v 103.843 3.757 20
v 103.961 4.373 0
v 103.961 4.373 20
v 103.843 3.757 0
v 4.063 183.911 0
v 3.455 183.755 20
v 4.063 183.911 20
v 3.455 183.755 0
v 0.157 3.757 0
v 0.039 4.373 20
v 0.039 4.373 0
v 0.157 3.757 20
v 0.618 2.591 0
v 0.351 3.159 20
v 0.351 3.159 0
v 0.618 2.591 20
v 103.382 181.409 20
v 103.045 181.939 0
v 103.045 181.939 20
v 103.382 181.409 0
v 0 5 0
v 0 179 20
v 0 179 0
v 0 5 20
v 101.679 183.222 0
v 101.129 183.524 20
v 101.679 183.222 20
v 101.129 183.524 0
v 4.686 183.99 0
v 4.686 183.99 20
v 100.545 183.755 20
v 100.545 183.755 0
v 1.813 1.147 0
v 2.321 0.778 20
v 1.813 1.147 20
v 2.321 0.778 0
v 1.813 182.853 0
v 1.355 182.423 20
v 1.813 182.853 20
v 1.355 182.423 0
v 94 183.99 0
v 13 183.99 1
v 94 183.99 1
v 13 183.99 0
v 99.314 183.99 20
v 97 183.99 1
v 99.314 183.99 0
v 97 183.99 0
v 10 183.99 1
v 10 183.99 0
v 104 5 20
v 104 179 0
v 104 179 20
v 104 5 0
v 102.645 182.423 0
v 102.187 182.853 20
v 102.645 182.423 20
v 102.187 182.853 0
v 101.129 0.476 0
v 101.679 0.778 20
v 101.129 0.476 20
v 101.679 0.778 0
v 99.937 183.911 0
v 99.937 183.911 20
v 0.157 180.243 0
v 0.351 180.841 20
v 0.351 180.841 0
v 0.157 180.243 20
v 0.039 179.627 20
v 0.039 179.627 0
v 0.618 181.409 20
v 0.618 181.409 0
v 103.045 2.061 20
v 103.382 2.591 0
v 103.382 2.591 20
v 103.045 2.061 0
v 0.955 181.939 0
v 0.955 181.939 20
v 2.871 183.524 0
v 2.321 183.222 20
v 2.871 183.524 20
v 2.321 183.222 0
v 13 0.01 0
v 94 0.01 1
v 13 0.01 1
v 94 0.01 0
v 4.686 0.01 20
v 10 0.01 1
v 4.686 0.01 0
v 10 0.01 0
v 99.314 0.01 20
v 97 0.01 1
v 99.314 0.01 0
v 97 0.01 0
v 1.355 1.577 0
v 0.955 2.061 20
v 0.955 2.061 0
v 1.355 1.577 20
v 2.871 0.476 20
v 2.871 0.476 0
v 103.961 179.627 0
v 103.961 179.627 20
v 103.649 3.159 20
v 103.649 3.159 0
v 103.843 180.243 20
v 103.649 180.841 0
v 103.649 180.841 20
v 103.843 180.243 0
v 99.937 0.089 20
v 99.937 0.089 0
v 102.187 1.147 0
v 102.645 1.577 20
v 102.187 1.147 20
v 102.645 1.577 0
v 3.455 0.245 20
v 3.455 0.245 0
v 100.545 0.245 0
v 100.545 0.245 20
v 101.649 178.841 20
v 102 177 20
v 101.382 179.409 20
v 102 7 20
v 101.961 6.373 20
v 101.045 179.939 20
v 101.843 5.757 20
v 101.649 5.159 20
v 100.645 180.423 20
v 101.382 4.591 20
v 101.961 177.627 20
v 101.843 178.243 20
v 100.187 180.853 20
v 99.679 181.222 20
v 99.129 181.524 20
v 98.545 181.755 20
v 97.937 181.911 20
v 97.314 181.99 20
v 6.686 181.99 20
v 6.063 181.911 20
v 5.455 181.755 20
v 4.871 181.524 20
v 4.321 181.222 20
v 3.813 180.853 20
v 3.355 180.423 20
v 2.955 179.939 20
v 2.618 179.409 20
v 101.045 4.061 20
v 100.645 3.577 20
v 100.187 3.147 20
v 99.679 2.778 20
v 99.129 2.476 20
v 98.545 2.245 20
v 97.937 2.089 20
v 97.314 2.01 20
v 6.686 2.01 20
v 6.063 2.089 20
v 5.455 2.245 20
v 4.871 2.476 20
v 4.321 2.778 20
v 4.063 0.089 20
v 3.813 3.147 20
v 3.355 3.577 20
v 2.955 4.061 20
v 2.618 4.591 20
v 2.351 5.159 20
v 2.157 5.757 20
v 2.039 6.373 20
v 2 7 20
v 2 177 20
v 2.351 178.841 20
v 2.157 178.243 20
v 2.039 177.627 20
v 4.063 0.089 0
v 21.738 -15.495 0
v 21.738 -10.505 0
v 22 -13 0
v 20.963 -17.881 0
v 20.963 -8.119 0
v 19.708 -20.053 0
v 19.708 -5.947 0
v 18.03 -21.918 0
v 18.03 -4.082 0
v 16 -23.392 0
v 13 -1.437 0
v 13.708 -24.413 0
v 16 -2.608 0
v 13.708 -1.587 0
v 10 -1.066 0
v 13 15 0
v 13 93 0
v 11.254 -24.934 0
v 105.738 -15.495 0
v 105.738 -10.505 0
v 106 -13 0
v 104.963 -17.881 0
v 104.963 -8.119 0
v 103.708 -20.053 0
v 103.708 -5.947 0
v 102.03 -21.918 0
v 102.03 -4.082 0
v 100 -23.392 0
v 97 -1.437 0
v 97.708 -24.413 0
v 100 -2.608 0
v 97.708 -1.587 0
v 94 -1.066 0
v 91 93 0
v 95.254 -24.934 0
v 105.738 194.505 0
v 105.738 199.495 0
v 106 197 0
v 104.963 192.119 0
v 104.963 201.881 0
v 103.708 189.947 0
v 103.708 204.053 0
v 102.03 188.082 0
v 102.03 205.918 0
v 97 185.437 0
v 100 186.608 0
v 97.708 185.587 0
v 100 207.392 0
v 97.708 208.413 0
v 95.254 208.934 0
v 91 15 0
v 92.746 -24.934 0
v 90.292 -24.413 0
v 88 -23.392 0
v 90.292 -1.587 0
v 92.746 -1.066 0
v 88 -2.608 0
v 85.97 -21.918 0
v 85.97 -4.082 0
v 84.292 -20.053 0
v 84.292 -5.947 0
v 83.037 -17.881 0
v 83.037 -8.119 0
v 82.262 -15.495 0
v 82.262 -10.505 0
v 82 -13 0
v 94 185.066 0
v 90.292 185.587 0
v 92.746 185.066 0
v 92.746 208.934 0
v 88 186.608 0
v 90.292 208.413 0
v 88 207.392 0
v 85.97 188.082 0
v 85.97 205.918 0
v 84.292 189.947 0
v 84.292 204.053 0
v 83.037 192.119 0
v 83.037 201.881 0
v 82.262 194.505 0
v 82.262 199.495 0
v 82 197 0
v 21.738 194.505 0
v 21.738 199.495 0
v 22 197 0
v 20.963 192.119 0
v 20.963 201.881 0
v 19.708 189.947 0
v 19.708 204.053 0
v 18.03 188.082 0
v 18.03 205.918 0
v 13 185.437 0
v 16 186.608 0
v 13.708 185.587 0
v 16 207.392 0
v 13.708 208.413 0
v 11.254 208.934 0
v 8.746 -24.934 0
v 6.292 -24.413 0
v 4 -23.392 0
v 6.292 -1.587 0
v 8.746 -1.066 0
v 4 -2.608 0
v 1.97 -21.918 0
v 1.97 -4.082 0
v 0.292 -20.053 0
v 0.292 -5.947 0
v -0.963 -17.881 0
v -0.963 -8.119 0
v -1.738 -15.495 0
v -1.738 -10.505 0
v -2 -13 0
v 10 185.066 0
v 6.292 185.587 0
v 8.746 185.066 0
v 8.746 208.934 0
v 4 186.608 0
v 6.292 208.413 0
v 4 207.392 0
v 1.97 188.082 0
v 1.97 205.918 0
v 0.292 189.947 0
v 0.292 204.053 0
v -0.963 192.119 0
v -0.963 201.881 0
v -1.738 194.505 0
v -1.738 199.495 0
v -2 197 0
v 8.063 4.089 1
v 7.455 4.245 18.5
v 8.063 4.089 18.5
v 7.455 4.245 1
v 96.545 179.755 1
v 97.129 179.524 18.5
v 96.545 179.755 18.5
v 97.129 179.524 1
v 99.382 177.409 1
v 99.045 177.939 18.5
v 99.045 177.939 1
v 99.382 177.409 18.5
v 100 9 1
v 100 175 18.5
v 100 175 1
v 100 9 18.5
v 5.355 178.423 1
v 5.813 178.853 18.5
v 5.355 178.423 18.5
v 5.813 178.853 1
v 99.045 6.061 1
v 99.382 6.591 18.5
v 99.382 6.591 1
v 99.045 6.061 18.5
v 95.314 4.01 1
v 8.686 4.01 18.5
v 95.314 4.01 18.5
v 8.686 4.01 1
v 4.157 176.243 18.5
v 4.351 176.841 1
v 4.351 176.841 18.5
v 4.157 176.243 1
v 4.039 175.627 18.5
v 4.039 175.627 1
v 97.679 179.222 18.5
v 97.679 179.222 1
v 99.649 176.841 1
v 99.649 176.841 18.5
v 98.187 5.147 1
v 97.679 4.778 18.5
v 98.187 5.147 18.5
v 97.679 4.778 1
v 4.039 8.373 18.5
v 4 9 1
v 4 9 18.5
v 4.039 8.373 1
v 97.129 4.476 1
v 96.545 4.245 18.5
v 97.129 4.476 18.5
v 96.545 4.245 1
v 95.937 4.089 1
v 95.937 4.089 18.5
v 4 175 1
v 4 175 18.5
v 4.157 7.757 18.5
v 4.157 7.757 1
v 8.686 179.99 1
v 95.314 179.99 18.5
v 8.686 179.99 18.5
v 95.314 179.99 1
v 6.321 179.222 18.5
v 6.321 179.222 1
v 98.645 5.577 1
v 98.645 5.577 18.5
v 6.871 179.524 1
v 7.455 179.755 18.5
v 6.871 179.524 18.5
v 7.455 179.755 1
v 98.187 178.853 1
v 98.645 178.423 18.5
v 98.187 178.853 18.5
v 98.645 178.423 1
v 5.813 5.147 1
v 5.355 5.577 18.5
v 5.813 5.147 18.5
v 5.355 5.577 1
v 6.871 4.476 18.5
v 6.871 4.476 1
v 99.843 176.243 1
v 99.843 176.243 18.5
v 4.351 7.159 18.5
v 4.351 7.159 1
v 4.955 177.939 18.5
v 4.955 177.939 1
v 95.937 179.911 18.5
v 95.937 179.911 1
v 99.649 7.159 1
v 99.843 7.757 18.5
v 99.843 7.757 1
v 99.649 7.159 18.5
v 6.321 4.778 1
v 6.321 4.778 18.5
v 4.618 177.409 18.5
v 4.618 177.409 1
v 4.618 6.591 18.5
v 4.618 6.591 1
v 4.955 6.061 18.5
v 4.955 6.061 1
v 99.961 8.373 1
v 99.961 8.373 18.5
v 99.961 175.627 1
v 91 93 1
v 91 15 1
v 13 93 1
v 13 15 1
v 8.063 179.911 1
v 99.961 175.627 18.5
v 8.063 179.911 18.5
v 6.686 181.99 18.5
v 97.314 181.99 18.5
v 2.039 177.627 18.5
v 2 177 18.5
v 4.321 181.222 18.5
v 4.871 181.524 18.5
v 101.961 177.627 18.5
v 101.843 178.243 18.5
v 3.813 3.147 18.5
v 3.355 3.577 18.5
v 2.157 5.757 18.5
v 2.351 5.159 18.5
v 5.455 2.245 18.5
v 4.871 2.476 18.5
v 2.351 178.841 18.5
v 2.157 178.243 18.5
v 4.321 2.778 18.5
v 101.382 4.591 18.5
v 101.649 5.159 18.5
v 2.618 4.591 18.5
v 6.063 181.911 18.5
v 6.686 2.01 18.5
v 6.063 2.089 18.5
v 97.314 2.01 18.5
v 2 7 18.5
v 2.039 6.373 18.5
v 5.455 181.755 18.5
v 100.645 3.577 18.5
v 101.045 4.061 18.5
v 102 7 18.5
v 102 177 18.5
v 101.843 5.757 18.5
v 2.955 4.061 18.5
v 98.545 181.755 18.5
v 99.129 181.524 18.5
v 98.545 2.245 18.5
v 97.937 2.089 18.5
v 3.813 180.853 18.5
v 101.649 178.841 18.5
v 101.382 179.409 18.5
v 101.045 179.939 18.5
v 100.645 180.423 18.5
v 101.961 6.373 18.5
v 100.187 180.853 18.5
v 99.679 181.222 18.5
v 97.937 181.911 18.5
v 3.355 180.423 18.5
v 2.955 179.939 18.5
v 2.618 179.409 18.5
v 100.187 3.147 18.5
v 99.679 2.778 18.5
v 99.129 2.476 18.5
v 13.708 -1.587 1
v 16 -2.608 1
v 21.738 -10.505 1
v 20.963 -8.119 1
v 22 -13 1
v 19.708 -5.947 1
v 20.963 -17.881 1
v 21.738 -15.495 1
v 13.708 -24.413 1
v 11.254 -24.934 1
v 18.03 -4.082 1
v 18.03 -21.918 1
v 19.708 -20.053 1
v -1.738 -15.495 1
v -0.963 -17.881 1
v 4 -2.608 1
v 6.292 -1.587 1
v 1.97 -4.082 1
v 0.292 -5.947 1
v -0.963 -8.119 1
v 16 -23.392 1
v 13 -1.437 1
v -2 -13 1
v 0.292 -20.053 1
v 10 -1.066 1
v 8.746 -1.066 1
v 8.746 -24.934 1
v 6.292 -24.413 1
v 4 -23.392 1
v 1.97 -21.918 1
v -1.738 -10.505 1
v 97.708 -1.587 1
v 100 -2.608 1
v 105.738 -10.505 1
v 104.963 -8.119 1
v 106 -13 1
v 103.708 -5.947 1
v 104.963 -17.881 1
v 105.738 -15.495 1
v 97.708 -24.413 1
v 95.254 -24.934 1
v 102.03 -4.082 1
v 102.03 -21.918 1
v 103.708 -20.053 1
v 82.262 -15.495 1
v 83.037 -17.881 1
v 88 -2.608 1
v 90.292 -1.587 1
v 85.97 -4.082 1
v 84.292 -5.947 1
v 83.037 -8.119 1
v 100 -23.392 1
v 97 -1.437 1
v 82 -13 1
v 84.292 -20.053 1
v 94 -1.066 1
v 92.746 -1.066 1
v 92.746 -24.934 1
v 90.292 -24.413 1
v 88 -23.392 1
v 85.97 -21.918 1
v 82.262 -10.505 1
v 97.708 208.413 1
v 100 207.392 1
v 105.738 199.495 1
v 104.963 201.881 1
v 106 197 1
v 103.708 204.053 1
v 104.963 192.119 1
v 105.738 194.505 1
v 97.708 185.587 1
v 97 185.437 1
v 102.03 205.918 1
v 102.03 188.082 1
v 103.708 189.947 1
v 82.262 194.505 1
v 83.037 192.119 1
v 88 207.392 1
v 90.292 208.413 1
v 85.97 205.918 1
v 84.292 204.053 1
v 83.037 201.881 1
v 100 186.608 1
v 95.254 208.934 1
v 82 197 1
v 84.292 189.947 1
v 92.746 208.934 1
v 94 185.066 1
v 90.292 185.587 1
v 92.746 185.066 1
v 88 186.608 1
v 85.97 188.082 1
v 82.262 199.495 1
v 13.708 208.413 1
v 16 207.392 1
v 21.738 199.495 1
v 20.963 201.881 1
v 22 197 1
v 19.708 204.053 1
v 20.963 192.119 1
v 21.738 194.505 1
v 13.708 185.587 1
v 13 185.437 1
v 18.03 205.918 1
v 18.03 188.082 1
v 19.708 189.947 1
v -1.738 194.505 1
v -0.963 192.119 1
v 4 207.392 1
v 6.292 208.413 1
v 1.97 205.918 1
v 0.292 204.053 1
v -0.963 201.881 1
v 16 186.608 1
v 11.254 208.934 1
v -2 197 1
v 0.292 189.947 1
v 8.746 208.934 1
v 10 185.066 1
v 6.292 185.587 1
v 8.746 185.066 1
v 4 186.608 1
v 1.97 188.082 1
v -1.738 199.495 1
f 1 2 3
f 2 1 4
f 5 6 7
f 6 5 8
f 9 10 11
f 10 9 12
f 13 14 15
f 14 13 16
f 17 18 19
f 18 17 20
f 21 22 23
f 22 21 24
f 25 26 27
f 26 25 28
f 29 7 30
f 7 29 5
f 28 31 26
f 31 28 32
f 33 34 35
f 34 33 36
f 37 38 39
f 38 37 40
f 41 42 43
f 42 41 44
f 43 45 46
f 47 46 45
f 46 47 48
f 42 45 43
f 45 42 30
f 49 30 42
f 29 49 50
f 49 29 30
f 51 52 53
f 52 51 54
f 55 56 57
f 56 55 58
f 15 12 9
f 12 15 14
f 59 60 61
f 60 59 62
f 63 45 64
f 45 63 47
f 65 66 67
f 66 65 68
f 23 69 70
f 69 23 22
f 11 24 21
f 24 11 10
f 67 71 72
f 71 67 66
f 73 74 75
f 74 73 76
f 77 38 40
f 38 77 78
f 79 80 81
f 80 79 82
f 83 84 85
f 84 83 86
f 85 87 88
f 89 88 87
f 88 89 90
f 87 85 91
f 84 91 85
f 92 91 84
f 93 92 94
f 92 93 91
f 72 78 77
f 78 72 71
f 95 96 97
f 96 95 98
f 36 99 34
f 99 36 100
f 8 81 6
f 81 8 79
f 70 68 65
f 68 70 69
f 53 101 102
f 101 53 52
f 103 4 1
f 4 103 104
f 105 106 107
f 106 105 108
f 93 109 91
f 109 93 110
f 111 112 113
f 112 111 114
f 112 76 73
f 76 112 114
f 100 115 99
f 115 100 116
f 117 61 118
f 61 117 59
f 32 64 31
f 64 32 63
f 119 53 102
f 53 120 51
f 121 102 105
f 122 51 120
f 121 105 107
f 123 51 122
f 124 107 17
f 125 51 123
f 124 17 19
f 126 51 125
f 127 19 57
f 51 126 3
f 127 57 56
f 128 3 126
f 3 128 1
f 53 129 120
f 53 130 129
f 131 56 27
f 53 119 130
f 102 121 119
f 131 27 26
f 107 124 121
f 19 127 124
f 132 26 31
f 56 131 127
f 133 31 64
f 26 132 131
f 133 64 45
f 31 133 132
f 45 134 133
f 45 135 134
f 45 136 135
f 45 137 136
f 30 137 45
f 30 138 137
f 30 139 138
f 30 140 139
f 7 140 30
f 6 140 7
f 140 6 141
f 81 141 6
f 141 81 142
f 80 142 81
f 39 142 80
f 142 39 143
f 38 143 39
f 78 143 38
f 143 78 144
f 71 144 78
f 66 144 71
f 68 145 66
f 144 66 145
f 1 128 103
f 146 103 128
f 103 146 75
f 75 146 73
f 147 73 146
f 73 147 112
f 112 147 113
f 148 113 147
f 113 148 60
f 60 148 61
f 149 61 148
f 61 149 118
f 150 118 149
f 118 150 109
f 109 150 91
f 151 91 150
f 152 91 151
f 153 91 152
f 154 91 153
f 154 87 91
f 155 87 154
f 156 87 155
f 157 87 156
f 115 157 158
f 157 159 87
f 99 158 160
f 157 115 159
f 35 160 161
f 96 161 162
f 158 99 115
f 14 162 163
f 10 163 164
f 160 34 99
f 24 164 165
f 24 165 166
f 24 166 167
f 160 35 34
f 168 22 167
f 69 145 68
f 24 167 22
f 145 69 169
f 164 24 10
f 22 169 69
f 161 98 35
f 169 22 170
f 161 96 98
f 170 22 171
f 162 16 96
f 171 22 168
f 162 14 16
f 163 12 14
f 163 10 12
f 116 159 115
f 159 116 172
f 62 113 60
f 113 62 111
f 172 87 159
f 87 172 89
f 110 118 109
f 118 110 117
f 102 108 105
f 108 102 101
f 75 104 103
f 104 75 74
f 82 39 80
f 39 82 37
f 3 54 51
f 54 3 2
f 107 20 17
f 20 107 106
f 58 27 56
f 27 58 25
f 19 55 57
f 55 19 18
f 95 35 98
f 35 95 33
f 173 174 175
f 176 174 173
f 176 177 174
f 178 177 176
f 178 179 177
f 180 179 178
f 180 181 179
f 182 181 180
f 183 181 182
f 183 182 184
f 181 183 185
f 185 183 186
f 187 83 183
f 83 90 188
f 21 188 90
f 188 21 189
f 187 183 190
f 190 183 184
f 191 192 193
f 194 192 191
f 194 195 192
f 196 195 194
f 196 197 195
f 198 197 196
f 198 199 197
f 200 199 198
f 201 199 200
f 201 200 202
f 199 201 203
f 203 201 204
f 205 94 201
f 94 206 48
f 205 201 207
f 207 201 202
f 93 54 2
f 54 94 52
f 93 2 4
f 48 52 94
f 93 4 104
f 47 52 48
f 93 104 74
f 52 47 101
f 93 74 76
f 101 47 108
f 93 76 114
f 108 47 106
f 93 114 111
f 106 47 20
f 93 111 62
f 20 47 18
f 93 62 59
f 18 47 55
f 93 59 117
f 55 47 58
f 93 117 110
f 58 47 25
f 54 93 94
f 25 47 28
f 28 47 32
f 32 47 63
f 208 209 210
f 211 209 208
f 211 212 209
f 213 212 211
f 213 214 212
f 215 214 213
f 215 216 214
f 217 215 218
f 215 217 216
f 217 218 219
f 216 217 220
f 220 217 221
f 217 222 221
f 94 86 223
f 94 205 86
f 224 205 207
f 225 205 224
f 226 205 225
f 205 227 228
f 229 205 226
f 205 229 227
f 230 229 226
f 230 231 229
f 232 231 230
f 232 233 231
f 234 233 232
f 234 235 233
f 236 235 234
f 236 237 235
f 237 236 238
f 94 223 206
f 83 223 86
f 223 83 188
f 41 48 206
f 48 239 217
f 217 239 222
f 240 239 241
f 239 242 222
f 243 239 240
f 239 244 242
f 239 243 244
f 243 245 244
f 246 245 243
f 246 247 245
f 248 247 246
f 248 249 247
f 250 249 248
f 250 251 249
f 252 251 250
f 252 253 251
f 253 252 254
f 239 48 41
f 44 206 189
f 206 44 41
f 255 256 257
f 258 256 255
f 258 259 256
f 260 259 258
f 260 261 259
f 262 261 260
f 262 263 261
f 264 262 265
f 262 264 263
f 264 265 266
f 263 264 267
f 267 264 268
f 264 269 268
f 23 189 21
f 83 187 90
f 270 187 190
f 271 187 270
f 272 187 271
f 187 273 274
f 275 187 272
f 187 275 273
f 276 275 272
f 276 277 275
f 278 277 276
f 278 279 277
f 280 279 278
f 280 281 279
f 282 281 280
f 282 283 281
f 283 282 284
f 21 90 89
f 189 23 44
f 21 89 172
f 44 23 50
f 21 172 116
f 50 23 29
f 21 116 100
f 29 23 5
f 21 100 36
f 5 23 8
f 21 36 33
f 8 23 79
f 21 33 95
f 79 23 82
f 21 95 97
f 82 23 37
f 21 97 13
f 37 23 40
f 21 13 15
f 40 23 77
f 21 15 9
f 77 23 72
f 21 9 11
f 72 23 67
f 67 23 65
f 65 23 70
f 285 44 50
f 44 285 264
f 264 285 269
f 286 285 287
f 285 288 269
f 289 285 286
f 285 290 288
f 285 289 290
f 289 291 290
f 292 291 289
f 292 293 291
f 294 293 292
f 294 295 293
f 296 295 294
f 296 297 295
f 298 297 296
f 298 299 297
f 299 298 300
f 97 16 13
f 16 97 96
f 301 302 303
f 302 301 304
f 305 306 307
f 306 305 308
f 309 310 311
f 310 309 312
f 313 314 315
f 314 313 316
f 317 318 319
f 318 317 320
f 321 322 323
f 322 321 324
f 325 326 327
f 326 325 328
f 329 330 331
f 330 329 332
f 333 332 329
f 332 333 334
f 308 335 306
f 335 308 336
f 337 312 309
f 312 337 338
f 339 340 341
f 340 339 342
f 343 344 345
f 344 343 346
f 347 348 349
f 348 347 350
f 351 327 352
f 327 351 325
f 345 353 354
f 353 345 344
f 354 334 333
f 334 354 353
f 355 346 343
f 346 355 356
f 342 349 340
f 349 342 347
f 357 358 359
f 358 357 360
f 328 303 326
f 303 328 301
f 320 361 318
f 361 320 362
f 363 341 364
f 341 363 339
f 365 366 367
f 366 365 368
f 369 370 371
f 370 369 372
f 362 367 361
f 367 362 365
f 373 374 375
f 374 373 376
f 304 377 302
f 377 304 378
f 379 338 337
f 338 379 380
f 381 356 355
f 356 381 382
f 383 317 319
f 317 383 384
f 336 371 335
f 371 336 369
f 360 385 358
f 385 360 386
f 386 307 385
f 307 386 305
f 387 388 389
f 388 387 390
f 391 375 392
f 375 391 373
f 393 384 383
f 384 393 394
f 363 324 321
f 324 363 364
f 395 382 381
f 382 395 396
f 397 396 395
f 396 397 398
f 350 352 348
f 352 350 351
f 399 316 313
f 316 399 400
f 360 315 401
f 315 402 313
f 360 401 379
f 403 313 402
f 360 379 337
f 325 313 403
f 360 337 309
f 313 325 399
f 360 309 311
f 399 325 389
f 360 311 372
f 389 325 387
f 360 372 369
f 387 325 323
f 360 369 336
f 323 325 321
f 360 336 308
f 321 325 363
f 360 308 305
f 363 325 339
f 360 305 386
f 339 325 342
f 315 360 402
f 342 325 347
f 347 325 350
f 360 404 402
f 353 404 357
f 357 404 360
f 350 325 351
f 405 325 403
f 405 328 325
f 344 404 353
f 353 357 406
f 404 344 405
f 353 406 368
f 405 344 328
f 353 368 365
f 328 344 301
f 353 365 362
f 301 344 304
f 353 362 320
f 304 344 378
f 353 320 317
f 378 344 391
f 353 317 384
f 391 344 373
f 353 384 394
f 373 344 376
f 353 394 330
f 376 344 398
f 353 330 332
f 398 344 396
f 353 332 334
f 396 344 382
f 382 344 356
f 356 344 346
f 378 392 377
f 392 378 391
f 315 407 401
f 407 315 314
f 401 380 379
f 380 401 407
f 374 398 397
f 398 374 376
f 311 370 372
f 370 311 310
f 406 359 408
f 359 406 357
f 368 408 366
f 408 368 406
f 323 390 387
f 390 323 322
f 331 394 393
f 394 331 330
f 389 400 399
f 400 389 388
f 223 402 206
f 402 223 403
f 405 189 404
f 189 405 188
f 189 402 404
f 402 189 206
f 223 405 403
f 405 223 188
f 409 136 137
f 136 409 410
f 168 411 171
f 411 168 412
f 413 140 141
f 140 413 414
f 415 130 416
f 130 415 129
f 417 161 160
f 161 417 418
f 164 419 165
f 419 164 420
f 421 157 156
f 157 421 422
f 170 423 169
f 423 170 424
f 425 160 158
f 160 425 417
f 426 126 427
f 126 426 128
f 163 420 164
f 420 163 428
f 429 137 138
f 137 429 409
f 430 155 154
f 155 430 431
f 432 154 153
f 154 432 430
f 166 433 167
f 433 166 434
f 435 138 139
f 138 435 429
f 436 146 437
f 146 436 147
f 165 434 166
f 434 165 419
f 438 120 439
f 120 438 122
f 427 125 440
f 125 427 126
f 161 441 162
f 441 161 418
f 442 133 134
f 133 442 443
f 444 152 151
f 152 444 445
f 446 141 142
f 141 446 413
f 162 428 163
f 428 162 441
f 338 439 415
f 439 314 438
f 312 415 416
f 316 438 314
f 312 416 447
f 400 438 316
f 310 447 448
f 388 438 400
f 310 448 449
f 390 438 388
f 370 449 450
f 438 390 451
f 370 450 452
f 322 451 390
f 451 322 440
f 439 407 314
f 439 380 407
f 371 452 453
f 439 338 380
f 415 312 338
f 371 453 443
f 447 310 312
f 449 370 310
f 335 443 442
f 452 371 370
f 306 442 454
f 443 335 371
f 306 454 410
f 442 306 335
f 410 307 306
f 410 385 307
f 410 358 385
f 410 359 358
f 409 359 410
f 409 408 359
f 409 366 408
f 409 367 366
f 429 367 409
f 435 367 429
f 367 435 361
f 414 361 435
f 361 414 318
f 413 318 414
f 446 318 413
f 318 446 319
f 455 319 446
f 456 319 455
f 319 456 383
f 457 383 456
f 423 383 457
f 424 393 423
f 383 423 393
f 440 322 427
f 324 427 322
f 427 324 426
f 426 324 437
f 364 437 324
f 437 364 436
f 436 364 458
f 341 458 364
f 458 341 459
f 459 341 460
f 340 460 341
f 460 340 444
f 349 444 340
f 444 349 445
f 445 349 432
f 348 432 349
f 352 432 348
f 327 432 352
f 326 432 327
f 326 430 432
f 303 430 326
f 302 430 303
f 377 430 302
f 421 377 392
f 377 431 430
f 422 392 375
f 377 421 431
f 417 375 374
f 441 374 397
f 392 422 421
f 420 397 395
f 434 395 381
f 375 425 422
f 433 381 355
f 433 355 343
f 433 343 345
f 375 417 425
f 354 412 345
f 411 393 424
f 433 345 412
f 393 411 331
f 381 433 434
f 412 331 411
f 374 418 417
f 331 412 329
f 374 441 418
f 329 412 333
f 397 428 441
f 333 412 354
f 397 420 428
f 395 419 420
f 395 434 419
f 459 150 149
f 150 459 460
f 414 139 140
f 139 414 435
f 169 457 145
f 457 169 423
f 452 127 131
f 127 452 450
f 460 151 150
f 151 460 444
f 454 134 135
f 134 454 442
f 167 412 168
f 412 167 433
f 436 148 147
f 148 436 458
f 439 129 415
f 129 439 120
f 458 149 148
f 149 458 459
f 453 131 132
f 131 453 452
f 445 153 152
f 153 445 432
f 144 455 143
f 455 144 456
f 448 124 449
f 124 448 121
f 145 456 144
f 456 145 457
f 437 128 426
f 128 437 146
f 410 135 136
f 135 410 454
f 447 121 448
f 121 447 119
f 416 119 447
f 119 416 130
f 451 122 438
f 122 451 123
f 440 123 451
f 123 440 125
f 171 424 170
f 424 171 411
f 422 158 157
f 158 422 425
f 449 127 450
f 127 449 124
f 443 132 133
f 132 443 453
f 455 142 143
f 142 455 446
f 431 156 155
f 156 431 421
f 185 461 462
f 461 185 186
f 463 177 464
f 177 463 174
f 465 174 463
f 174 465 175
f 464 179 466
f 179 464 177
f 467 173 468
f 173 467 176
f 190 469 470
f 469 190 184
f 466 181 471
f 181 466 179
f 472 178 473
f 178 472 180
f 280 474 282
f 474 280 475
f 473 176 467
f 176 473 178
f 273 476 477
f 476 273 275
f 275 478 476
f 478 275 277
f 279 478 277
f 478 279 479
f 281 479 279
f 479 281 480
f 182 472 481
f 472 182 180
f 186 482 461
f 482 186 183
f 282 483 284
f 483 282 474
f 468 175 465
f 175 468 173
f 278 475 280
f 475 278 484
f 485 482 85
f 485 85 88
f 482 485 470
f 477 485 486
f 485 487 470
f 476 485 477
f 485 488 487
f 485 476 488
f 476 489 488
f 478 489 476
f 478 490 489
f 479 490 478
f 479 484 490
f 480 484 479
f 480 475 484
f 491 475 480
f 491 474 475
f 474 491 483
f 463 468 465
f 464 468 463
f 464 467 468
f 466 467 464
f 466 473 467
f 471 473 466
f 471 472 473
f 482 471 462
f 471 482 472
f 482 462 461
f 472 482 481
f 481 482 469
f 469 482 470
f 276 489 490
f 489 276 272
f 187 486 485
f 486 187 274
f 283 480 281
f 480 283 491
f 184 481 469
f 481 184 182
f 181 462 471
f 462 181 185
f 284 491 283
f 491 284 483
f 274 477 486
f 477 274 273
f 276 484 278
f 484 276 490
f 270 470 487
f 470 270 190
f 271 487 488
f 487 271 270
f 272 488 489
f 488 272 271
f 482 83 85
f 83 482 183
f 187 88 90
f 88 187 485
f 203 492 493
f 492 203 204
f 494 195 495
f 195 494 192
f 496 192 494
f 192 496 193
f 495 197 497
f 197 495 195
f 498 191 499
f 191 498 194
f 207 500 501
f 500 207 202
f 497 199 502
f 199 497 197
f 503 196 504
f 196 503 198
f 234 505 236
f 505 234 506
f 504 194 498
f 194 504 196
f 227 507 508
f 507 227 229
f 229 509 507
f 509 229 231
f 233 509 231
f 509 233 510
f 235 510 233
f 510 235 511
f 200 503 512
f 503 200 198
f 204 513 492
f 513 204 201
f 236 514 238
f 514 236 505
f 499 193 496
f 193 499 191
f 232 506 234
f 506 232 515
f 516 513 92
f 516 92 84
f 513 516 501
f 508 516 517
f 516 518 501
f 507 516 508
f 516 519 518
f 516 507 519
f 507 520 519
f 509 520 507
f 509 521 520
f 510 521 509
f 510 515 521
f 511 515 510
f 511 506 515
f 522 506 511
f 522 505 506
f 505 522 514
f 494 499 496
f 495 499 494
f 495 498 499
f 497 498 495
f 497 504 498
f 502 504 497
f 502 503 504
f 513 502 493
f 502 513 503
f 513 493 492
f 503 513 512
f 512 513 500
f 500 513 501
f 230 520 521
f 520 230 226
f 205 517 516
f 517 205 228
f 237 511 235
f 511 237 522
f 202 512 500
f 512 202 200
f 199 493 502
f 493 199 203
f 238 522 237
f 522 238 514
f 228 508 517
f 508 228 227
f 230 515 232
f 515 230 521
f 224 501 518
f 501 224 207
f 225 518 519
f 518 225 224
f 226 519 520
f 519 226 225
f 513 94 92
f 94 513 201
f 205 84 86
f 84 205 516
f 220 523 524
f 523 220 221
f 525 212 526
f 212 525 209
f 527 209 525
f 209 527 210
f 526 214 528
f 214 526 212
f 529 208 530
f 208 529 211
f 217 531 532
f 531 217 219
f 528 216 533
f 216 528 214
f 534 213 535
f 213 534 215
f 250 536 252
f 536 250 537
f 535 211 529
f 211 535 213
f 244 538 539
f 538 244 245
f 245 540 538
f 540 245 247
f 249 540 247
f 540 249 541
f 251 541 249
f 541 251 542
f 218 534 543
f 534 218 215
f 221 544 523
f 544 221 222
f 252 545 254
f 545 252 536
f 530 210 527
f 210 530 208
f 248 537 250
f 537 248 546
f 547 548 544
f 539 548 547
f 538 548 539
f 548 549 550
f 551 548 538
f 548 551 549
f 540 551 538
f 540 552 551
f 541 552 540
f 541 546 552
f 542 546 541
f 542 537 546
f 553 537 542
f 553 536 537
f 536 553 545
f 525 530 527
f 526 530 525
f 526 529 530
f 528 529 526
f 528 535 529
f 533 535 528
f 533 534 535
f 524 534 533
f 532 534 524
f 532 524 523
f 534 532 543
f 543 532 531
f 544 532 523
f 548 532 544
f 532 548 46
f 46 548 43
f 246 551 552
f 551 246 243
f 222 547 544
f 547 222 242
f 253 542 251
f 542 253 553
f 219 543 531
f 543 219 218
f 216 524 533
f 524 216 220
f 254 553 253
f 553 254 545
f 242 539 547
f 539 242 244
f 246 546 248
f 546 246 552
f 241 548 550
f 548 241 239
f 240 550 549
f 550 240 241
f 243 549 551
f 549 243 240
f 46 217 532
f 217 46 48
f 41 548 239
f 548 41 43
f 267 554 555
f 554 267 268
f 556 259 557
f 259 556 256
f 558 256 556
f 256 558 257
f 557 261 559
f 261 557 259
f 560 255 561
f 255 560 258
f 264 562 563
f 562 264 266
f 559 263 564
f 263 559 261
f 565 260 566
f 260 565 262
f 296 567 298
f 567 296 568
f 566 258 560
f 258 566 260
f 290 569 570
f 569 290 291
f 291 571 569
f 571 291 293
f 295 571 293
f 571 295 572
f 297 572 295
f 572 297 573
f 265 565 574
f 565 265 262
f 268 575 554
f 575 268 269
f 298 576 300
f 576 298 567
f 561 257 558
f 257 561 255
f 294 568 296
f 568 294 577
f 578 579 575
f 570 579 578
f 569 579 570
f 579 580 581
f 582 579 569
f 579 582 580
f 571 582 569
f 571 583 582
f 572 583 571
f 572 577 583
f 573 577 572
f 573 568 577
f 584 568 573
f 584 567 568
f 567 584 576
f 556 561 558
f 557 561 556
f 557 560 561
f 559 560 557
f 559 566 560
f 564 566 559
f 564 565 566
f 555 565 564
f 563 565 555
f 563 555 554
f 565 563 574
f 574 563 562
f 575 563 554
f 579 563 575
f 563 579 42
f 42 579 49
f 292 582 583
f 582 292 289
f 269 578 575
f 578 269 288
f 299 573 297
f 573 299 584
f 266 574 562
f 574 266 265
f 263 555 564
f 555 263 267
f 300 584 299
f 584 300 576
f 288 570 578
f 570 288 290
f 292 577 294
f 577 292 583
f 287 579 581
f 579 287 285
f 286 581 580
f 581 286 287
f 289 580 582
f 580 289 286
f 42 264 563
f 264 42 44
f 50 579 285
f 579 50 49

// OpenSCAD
// Size of the outer bezel that surounds the PCB
bezelSize = 2;

// Thickness of the wall.
wallThickness = 8;

// PCB size we are trying to fit.
pcbHeight = 180;
pcbWidth = 100;
// How thick (deep) the front panel is (1.6mm FR4 PCB)
pcbThickness = 1.6;

// Overall size
height = pcbHeight + (2*bezelSize);
width = pcbWidth + (2*bezelSize);
depth = 20;



// Switch size (physical size of the light switch being covered)
switchHeight = 88;
switchWidth = 88;
switchDepth = 22;
// How much the switch body should overlap onto the base
switchOverlap = 5;

middleDepth = 10;



// How deep the inside of the box is.
baseInnerThickness = 1;

// -----------------------------------------
// -----------------------------------------
module GenericBase(xDistance, yDistance, zHeight) {
	// roundedBox([xDistance, yDistance, zHeight], 2, true);

	// Create a rectangluar base to work from that
	// is xDistance by yDistance and zHeight height.

	// This is effectivly a cube with rounded corners

	// extend the base out by 3.5 from holes by using minkowski
	// which gives rounded corners to the board in the process
	// matching the Gadgeteer design
	
	$fn=50;
	radius = 5; //bezelSize;


	translate([radius,radius,0]) {
		minkowski()
		{
			// 3D Minkowski sum all dimensions will be the sum of the two object's dimensions
			cube([xDistance-(radius*2), yDistance-(radius*2), zHeight /2]);
			cylinder(r=radius,h=zHeight/2);
		}
	}
}

// -----------------------------------------
// -----------------------------------------
module LightSwitchBase() {
	
	innerWallOffset = 4;

	difference() {
		union() 
		{
			// Outer base wall
			OuterWall();
		}		
		union() 
		{
			SwitchCutout();
			PcbCutout();
		}
	}
}

// -----------------------------------------
// Outer wall
// -----------------------------------------
module OuterWall() {

innerCutoutOffset = bezelSize + 2; // Wall thickness

	difference() {
		union() {
			GenericBase(width, height, depth);
		}
		union() {
			// Cut out the bulk of the inside of the box.
			// Outerwall padding = 5
			// Move in 5, down 5 and up 2 to provide an 
			// outline of 5x5 with 2 base.
			translate([innerCutoutOffset, innerCutoutOffset, baseInnerThickness]) {
				GenericBase(width - (innerCutoutOffset * 2), 
									height - (innerCutoutOffset *2), 
									(depth - baseInnerThickness) + 1);
			}
		}
	}
}

// -----------------------------------------
// -----------------------------------------
module SwitchCutout() {

	// Cutout smaller than the actual switch to allow for the overlap all around
	cutoutWidth = switchWidth - (switchOverlap*2);
	cutoutHeight = switchHeight - (switchOverlap*2);	

	// Padding either side of the cutout.
	paddingWidth = (width - cutoutWidth) / 2;
	paddingHeight = 15; // Fixed padding from top.

	// Switch cutout.
	// Cut out a area less wide than the switch so it sits on it 
	// keeping the box against the wall
	// -1 z to ensure it goes all the way through
	translate([paddingWidth, paddingHeight, -1]) {
		cube([cutoutWidth, cutoutHeight, 4]);
	}

	// Switch body
	// Create a block to show how the switch body sits
	// in the base.
	switchOuterPaddingWidth = (width - switchWidth) /2;
	switchOuterPaddingHeight = paddingHeight - switchOverlap;

	translate([switchOuterPaddingWidth , switchOuterPaddingHeight,1]) {
		color( [1, 0, 0, 0.90] ) {
				cube([switchWidth, switchHeight, switchDepth]);
		}
	}
}

// -----------------------------------------
// -----------------------------------------
module PcbCutout() {
	// Move to a slight offset to allow for an outer bezel.
	// and position so the top of the pcb is at the top of the base box.
	translate([bezelSize, bezelSize, depth - (pcbThickness - 0.1)]) {
		//cube([cutoutWidth, cutoutHeight, 4]);

		GenericBase(pcbWidth, pcbHeight, pcbThickness);
	}
}

// -----------------------------------------
// Add ears to the base to help prevent lift.
// -----------------------------------------
module GiveItEars() {
earSize = 12;
yFudgeForEarOverlap = -1;
earDepth = 1;
connectorWidth = 3;
connectorLength = earSize - yFudgeForEarOverlap + 2;
earOffset = -2;

	translate([0 + earSize + earOffset, -earSize + yFudgeForEarOverlap,0])  {
		cylinder(r=earSize,h=earDepth);
		cube([connectorWidth, connectorLength, earDepth]);
	}

	translate([width - earSize - earOffset, -earSize + yFudgeForEarOverlap,0]) {
		cylinder(r=earSize,h=earDepth);
		cube([connectorWidth, connectorLength, earDepth]);
	}

	translate([width - earSize - earOffset,height + earSize - yFudgeForEarOverlap,0]) {
		cylinder(r=earSize,h=earDepth);
		translate([0,-connectorLength,0] ) {
			cube([connectorWidth, connectorLength, earDepth]);
		}
	}

	translate([0 + earSize + earOffset,height + earSize - yFudgeForEarOverlap,0]) {
		cylinder(r=earSize,h=earDepth);
		translate([0,-connectorLength,0] ) {
			cube([connectorWidth, connectorLength, earDepth]);
		}
	}
}

// -----------------------------------------
// -----------------------------------------
module Debug() {

	LightSwitchBase();

	GiveItEars();
}

// Comment out when building, uncomment for debug.
Debug();
